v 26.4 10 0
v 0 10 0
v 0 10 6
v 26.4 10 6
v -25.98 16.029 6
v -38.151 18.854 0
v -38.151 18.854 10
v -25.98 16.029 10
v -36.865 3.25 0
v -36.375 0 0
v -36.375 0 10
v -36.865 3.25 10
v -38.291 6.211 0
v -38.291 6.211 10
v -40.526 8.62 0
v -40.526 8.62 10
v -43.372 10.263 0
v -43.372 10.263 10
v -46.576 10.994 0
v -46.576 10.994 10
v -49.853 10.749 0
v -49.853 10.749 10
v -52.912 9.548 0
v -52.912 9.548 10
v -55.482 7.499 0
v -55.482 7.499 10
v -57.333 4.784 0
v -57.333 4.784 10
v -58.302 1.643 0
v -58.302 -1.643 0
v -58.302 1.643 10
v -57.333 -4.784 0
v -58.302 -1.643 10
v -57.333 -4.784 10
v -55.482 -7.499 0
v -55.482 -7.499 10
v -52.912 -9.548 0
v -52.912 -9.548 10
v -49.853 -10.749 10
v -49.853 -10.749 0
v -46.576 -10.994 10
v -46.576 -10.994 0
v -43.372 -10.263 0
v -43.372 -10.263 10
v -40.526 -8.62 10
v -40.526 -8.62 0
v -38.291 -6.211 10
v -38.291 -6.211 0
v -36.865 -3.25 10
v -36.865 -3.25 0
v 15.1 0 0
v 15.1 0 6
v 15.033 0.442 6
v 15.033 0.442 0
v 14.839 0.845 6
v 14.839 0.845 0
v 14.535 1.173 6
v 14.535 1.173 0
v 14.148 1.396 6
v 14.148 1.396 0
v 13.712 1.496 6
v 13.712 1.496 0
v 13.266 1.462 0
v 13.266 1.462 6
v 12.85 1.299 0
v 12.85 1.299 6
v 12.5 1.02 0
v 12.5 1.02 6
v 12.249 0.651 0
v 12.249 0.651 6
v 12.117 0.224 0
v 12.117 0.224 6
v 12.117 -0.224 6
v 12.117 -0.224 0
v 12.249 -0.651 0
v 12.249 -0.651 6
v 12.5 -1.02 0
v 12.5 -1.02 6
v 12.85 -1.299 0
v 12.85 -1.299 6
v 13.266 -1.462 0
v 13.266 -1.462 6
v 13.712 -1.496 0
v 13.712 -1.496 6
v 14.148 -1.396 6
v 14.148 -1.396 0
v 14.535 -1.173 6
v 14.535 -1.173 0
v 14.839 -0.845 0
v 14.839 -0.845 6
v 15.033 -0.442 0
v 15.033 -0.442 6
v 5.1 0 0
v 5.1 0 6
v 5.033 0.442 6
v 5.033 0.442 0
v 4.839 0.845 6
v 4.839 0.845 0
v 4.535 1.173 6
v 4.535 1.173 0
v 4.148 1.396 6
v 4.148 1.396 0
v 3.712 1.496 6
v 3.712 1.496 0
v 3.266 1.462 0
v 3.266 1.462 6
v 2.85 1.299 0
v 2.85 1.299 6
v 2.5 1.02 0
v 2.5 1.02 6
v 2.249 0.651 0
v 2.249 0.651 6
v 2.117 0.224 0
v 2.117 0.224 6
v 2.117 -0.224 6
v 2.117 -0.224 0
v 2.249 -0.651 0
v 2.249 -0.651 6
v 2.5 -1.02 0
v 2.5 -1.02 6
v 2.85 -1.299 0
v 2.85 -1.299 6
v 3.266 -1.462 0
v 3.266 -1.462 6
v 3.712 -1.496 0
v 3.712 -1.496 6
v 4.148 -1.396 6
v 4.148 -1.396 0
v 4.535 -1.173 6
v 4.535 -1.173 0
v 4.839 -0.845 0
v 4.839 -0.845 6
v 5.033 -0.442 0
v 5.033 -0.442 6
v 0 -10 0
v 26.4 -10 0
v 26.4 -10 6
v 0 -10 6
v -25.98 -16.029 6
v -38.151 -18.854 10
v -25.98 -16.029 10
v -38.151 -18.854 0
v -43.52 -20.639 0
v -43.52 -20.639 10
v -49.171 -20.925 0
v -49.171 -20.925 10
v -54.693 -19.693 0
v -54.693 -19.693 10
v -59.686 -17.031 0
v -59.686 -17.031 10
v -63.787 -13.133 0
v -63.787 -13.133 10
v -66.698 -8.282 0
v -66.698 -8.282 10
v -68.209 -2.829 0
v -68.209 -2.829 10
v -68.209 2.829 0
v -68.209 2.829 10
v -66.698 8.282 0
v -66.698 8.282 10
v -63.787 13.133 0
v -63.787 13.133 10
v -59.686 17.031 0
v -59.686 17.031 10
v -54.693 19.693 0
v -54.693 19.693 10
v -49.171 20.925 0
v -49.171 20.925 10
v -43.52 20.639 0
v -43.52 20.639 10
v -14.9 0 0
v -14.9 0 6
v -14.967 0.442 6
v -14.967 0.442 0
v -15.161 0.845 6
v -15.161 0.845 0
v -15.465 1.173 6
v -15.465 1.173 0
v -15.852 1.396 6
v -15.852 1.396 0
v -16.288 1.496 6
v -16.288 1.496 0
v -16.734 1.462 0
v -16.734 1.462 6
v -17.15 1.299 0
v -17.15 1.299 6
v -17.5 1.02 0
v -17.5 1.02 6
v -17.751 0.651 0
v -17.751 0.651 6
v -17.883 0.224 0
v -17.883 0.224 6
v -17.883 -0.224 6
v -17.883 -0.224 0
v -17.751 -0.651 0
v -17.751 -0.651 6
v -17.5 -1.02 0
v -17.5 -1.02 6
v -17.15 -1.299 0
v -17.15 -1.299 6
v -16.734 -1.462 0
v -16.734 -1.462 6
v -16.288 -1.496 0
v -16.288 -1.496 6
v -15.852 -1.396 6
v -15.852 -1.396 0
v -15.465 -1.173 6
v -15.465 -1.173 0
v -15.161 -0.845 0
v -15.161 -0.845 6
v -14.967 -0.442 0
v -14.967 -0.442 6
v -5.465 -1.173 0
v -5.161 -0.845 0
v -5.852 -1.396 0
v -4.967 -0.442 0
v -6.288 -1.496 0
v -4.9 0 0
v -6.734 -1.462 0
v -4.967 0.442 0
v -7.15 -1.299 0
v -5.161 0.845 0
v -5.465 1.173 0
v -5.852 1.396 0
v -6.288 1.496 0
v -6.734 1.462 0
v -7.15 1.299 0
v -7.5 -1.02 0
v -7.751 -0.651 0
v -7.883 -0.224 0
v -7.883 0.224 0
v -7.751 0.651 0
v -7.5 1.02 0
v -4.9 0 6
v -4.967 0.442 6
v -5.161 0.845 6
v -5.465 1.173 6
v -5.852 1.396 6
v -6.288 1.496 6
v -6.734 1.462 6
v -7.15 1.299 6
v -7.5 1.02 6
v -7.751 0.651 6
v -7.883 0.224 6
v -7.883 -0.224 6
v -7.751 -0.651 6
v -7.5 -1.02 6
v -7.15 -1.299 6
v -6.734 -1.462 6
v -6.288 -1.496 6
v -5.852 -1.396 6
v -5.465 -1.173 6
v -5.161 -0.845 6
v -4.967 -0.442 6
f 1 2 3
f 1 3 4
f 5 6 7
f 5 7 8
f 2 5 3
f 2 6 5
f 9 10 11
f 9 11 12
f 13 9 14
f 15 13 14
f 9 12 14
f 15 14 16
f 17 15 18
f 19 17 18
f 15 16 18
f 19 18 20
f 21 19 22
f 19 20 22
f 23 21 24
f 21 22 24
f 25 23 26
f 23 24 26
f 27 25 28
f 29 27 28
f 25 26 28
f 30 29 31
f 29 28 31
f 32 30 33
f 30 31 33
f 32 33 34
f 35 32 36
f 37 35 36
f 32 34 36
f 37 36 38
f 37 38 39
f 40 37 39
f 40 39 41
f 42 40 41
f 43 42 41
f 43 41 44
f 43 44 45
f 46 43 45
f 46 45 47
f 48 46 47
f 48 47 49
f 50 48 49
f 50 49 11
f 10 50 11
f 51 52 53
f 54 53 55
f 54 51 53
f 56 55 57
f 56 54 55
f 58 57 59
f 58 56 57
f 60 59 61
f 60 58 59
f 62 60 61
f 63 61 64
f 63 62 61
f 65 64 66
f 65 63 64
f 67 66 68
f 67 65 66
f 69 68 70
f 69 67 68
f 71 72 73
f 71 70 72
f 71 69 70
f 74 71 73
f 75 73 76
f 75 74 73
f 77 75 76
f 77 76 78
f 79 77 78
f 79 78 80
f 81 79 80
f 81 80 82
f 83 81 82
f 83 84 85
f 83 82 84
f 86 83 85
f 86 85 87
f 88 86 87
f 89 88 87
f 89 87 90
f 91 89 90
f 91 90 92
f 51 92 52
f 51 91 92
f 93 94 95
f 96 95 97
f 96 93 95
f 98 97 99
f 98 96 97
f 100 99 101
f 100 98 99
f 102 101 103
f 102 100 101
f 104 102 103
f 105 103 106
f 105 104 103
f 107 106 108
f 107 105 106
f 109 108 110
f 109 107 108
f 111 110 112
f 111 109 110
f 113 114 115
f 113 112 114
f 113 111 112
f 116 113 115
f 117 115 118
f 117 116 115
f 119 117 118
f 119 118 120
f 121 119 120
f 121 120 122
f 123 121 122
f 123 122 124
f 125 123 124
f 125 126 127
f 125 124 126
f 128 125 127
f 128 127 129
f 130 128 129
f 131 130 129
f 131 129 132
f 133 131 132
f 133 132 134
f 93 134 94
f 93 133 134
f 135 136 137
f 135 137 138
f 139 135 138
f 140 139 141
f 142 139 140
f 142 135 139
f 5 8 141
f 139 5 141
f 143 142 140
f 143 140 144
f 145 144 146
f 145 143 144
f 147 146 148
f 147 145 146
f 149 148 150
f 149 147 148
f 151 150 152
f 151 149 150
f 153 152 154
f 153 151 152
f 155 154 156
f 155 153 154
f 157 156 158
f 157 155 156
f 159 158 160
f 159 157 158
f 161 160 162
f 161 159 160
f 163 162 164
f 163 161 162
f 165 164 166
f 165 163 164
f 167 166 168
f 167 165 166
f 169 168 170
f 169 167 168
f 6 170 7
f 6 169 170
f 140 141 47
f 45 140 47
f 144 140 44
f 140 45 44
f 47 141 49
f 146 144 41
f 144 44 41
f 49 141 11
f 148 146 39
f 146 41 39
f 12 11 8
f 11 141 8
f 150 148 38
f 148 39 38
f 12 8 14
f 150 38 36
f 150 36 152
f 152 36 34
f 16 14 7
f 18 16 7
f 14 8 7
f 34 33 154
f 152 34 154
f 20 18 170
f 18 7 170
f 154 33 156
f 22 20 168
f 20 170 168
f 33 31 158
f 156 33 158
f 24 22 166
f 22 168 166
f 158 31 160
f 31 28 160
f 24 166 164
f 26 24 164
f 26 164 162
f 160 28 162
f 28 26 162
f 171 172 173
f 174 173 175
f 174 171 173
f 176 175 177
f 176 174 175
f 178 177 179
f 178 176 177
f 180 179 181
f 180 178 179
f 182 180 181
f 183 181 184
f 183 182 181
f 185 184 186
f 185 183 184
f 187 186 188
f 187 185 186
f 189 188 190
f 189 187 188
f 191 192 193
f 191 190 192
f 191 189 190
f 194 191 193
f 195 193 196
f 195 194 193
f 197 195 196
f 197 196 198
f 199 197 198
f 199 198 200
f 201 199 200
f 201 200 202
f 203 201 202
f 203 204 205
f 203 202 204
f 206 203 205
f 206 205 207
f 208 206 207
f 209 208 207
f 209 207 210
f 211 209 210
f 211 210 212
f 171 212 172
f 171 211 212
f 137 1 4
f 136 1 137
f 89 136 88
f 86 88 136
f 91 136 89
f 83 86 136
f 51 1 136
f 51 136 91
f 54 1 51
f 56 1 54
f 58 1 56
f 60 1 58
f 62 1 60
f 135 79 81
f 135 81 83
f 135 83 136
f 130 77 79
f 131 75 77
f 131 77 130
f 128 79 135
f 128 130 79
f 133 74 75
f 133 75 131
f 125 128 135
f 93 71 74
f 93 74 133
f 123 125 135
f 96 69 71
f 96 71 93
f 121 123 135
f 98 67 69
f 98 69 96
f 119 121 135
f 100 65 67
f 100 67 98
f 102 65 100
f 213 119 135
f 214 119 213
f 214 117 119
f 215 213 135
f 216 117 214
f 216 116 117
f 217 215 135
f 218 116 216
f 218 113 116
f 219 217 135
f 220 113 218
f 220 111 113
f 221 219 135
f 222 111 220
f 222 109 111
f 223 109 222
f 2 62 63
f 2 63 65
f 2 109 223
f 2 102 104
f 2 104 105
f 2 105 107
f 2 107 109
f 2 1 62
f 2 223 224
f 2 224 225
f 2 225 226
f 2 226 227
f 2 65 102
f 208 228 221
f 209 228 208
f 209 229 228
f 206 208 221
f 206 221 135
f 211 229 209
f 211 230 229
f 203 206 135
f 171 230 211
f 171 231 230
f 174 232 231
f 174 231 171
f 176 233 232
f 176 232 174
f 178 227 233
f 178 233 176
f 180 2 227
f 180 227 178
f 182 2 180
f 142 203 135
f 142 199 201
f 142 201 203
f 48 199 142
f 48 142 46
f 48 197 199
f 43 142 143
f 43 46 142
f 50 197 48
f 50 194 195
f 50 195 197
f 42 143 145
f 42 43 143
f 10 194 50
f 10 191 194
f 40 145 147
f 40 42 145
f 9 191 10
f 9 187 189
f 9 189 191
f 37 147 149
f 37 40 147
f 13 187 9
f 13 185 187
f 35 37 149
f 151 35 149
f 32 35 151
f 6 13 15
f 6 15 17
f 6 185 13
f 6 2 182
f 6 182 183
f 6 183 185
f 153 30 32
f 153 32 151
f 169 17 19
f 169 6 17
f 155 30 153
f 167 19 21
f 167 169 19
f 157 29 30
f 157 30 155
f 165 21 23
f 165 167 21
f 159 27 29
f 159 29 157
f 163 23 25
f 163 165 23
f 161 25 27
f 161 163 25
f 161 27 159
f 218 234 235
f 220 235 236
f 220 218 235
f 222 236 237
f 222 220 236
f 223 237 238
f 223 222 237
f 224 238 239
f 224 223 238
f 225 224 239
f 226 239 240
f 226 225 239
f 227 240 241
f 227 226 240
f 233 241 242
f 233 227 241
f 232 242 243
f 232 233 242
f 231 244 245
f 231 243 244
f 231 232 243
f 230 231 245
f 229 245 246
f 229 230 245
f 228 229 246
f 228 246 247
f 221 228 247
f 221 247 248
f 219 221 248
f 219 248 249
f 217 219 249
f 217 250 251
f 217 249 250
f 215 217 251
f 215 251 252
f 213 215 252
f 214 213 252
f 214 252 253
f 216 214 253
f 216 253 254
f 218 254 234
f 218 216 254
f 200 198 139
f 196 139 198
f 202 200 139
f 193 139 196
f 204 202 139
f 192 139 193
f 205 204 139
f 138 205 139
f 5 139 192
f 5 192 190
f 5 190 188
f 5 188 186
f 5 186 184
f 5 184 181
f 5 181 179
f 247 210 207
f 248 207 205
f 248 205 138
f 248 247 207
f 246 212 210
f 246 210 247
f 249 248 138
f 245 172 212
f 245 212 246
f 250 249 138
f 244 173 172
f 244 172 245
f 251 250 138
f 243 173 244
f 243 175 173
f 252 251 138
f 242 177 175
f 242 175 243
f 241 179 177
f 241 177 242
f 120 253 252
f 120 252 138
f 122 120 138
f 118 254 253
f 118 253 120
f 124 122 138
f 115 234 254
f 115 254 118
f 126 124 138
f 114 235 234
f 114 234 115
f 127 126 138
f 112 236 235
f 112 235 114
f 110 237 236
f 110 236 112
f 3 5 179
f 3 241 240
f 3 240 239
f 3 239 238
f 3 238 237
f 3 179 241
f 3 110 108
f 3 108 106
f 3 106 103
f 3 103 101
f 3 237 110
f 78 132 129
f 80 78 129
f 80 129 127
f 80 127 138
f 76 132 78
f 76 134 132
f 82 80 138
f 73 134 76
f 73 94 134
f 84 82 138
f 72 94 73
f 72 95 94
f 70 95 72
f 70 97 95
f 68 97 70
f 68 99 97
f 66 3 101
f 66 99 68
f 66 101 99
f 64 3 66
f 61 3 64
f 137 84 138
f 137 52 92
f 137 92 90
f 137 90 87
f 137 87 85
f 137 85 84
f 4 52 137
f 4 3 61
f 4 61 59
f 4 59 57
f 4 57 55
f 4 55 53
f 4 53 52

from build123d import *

# Parameters (mm, degrees)
IZIM1_R                     = 7.5
IZIM1_R_2                   = 1.5
Y_KSEKLIK_EKSTR_ZYON1_DEPTH = 10
KES_EKSTR_ZYON1_DEPTH       = 4
IZIM3_R                     = 11.025
KES_EKSTR_ZYON2_DEPTH       = 69


with BuildPart() as part:
    # Çizim1 → Yükseklik-Ekstrüzyon1 (new body)
    with BuildSketch(Plane.XY):
        with BuildLine():
            Line((-38.151258574, 18.853667601), (0, 10))
            Line((0, 10), (26.4, 10))
            Line((26.4, 10), (26.4, -10))
            Line((26.4, -10), (0, -10))
            Line((0, -10), (-38.151258574, -18.853667601))
            ThreePointArc((-38.151258574, -18.853667601), (-68.4, 0), (-38.151258574, 18.853667601))
        make_face()
        with Locations((-47.4, 0)):
            Circle(IZIM1_R, mode=Mode.SUBTRACT)
        with Locations((-16.4, 0)):
            Circle(IZIM1_R_2, mode=Mode.SUBTRACT)
        with Locations((-6.4, 0)):
            Circle(IZIM1_R_2, mode=Mode.SUBTRACT)
        with Locations((3.6, 0)):
            Circle(IZIM1_R_2, mode=Mode.SUBTRACT)
        with Locations((13.6, 0)):
            Circle(IZIM1_R_2, mode=Mode.SUBTRACT)
    extrude(amount=Y_KSEKLIK_EKSTR_ZYON1_DEPTH)

    # Çizim2 → Kes-Ekstrüzyon1 (cut)
    with BuildSketch(Plane.XY.offset(10)):
        Polygon((-25.98, -16.029113924), (0, -10), (26.4, -10), (26.4, 10), (0, 10), (-25.98, 16.029113924), align=None)
    extrude(amount=-KES_EKSTR_ZYON1_DEPTH, mode=Mode.SUBTRACT)

    # Çizim3 → Kes-Ekstrüzyon2 (cut)
    with BuildSketch(Plane.XY.offset(10)):
        with Locations((-47.4, 0)):
            Circle(IZIM3_R)
    extrude(amount=-KES_EKSTR_ZYON2_DEPTH, mode=Mode.SUBTRACT)


solid = part.part
